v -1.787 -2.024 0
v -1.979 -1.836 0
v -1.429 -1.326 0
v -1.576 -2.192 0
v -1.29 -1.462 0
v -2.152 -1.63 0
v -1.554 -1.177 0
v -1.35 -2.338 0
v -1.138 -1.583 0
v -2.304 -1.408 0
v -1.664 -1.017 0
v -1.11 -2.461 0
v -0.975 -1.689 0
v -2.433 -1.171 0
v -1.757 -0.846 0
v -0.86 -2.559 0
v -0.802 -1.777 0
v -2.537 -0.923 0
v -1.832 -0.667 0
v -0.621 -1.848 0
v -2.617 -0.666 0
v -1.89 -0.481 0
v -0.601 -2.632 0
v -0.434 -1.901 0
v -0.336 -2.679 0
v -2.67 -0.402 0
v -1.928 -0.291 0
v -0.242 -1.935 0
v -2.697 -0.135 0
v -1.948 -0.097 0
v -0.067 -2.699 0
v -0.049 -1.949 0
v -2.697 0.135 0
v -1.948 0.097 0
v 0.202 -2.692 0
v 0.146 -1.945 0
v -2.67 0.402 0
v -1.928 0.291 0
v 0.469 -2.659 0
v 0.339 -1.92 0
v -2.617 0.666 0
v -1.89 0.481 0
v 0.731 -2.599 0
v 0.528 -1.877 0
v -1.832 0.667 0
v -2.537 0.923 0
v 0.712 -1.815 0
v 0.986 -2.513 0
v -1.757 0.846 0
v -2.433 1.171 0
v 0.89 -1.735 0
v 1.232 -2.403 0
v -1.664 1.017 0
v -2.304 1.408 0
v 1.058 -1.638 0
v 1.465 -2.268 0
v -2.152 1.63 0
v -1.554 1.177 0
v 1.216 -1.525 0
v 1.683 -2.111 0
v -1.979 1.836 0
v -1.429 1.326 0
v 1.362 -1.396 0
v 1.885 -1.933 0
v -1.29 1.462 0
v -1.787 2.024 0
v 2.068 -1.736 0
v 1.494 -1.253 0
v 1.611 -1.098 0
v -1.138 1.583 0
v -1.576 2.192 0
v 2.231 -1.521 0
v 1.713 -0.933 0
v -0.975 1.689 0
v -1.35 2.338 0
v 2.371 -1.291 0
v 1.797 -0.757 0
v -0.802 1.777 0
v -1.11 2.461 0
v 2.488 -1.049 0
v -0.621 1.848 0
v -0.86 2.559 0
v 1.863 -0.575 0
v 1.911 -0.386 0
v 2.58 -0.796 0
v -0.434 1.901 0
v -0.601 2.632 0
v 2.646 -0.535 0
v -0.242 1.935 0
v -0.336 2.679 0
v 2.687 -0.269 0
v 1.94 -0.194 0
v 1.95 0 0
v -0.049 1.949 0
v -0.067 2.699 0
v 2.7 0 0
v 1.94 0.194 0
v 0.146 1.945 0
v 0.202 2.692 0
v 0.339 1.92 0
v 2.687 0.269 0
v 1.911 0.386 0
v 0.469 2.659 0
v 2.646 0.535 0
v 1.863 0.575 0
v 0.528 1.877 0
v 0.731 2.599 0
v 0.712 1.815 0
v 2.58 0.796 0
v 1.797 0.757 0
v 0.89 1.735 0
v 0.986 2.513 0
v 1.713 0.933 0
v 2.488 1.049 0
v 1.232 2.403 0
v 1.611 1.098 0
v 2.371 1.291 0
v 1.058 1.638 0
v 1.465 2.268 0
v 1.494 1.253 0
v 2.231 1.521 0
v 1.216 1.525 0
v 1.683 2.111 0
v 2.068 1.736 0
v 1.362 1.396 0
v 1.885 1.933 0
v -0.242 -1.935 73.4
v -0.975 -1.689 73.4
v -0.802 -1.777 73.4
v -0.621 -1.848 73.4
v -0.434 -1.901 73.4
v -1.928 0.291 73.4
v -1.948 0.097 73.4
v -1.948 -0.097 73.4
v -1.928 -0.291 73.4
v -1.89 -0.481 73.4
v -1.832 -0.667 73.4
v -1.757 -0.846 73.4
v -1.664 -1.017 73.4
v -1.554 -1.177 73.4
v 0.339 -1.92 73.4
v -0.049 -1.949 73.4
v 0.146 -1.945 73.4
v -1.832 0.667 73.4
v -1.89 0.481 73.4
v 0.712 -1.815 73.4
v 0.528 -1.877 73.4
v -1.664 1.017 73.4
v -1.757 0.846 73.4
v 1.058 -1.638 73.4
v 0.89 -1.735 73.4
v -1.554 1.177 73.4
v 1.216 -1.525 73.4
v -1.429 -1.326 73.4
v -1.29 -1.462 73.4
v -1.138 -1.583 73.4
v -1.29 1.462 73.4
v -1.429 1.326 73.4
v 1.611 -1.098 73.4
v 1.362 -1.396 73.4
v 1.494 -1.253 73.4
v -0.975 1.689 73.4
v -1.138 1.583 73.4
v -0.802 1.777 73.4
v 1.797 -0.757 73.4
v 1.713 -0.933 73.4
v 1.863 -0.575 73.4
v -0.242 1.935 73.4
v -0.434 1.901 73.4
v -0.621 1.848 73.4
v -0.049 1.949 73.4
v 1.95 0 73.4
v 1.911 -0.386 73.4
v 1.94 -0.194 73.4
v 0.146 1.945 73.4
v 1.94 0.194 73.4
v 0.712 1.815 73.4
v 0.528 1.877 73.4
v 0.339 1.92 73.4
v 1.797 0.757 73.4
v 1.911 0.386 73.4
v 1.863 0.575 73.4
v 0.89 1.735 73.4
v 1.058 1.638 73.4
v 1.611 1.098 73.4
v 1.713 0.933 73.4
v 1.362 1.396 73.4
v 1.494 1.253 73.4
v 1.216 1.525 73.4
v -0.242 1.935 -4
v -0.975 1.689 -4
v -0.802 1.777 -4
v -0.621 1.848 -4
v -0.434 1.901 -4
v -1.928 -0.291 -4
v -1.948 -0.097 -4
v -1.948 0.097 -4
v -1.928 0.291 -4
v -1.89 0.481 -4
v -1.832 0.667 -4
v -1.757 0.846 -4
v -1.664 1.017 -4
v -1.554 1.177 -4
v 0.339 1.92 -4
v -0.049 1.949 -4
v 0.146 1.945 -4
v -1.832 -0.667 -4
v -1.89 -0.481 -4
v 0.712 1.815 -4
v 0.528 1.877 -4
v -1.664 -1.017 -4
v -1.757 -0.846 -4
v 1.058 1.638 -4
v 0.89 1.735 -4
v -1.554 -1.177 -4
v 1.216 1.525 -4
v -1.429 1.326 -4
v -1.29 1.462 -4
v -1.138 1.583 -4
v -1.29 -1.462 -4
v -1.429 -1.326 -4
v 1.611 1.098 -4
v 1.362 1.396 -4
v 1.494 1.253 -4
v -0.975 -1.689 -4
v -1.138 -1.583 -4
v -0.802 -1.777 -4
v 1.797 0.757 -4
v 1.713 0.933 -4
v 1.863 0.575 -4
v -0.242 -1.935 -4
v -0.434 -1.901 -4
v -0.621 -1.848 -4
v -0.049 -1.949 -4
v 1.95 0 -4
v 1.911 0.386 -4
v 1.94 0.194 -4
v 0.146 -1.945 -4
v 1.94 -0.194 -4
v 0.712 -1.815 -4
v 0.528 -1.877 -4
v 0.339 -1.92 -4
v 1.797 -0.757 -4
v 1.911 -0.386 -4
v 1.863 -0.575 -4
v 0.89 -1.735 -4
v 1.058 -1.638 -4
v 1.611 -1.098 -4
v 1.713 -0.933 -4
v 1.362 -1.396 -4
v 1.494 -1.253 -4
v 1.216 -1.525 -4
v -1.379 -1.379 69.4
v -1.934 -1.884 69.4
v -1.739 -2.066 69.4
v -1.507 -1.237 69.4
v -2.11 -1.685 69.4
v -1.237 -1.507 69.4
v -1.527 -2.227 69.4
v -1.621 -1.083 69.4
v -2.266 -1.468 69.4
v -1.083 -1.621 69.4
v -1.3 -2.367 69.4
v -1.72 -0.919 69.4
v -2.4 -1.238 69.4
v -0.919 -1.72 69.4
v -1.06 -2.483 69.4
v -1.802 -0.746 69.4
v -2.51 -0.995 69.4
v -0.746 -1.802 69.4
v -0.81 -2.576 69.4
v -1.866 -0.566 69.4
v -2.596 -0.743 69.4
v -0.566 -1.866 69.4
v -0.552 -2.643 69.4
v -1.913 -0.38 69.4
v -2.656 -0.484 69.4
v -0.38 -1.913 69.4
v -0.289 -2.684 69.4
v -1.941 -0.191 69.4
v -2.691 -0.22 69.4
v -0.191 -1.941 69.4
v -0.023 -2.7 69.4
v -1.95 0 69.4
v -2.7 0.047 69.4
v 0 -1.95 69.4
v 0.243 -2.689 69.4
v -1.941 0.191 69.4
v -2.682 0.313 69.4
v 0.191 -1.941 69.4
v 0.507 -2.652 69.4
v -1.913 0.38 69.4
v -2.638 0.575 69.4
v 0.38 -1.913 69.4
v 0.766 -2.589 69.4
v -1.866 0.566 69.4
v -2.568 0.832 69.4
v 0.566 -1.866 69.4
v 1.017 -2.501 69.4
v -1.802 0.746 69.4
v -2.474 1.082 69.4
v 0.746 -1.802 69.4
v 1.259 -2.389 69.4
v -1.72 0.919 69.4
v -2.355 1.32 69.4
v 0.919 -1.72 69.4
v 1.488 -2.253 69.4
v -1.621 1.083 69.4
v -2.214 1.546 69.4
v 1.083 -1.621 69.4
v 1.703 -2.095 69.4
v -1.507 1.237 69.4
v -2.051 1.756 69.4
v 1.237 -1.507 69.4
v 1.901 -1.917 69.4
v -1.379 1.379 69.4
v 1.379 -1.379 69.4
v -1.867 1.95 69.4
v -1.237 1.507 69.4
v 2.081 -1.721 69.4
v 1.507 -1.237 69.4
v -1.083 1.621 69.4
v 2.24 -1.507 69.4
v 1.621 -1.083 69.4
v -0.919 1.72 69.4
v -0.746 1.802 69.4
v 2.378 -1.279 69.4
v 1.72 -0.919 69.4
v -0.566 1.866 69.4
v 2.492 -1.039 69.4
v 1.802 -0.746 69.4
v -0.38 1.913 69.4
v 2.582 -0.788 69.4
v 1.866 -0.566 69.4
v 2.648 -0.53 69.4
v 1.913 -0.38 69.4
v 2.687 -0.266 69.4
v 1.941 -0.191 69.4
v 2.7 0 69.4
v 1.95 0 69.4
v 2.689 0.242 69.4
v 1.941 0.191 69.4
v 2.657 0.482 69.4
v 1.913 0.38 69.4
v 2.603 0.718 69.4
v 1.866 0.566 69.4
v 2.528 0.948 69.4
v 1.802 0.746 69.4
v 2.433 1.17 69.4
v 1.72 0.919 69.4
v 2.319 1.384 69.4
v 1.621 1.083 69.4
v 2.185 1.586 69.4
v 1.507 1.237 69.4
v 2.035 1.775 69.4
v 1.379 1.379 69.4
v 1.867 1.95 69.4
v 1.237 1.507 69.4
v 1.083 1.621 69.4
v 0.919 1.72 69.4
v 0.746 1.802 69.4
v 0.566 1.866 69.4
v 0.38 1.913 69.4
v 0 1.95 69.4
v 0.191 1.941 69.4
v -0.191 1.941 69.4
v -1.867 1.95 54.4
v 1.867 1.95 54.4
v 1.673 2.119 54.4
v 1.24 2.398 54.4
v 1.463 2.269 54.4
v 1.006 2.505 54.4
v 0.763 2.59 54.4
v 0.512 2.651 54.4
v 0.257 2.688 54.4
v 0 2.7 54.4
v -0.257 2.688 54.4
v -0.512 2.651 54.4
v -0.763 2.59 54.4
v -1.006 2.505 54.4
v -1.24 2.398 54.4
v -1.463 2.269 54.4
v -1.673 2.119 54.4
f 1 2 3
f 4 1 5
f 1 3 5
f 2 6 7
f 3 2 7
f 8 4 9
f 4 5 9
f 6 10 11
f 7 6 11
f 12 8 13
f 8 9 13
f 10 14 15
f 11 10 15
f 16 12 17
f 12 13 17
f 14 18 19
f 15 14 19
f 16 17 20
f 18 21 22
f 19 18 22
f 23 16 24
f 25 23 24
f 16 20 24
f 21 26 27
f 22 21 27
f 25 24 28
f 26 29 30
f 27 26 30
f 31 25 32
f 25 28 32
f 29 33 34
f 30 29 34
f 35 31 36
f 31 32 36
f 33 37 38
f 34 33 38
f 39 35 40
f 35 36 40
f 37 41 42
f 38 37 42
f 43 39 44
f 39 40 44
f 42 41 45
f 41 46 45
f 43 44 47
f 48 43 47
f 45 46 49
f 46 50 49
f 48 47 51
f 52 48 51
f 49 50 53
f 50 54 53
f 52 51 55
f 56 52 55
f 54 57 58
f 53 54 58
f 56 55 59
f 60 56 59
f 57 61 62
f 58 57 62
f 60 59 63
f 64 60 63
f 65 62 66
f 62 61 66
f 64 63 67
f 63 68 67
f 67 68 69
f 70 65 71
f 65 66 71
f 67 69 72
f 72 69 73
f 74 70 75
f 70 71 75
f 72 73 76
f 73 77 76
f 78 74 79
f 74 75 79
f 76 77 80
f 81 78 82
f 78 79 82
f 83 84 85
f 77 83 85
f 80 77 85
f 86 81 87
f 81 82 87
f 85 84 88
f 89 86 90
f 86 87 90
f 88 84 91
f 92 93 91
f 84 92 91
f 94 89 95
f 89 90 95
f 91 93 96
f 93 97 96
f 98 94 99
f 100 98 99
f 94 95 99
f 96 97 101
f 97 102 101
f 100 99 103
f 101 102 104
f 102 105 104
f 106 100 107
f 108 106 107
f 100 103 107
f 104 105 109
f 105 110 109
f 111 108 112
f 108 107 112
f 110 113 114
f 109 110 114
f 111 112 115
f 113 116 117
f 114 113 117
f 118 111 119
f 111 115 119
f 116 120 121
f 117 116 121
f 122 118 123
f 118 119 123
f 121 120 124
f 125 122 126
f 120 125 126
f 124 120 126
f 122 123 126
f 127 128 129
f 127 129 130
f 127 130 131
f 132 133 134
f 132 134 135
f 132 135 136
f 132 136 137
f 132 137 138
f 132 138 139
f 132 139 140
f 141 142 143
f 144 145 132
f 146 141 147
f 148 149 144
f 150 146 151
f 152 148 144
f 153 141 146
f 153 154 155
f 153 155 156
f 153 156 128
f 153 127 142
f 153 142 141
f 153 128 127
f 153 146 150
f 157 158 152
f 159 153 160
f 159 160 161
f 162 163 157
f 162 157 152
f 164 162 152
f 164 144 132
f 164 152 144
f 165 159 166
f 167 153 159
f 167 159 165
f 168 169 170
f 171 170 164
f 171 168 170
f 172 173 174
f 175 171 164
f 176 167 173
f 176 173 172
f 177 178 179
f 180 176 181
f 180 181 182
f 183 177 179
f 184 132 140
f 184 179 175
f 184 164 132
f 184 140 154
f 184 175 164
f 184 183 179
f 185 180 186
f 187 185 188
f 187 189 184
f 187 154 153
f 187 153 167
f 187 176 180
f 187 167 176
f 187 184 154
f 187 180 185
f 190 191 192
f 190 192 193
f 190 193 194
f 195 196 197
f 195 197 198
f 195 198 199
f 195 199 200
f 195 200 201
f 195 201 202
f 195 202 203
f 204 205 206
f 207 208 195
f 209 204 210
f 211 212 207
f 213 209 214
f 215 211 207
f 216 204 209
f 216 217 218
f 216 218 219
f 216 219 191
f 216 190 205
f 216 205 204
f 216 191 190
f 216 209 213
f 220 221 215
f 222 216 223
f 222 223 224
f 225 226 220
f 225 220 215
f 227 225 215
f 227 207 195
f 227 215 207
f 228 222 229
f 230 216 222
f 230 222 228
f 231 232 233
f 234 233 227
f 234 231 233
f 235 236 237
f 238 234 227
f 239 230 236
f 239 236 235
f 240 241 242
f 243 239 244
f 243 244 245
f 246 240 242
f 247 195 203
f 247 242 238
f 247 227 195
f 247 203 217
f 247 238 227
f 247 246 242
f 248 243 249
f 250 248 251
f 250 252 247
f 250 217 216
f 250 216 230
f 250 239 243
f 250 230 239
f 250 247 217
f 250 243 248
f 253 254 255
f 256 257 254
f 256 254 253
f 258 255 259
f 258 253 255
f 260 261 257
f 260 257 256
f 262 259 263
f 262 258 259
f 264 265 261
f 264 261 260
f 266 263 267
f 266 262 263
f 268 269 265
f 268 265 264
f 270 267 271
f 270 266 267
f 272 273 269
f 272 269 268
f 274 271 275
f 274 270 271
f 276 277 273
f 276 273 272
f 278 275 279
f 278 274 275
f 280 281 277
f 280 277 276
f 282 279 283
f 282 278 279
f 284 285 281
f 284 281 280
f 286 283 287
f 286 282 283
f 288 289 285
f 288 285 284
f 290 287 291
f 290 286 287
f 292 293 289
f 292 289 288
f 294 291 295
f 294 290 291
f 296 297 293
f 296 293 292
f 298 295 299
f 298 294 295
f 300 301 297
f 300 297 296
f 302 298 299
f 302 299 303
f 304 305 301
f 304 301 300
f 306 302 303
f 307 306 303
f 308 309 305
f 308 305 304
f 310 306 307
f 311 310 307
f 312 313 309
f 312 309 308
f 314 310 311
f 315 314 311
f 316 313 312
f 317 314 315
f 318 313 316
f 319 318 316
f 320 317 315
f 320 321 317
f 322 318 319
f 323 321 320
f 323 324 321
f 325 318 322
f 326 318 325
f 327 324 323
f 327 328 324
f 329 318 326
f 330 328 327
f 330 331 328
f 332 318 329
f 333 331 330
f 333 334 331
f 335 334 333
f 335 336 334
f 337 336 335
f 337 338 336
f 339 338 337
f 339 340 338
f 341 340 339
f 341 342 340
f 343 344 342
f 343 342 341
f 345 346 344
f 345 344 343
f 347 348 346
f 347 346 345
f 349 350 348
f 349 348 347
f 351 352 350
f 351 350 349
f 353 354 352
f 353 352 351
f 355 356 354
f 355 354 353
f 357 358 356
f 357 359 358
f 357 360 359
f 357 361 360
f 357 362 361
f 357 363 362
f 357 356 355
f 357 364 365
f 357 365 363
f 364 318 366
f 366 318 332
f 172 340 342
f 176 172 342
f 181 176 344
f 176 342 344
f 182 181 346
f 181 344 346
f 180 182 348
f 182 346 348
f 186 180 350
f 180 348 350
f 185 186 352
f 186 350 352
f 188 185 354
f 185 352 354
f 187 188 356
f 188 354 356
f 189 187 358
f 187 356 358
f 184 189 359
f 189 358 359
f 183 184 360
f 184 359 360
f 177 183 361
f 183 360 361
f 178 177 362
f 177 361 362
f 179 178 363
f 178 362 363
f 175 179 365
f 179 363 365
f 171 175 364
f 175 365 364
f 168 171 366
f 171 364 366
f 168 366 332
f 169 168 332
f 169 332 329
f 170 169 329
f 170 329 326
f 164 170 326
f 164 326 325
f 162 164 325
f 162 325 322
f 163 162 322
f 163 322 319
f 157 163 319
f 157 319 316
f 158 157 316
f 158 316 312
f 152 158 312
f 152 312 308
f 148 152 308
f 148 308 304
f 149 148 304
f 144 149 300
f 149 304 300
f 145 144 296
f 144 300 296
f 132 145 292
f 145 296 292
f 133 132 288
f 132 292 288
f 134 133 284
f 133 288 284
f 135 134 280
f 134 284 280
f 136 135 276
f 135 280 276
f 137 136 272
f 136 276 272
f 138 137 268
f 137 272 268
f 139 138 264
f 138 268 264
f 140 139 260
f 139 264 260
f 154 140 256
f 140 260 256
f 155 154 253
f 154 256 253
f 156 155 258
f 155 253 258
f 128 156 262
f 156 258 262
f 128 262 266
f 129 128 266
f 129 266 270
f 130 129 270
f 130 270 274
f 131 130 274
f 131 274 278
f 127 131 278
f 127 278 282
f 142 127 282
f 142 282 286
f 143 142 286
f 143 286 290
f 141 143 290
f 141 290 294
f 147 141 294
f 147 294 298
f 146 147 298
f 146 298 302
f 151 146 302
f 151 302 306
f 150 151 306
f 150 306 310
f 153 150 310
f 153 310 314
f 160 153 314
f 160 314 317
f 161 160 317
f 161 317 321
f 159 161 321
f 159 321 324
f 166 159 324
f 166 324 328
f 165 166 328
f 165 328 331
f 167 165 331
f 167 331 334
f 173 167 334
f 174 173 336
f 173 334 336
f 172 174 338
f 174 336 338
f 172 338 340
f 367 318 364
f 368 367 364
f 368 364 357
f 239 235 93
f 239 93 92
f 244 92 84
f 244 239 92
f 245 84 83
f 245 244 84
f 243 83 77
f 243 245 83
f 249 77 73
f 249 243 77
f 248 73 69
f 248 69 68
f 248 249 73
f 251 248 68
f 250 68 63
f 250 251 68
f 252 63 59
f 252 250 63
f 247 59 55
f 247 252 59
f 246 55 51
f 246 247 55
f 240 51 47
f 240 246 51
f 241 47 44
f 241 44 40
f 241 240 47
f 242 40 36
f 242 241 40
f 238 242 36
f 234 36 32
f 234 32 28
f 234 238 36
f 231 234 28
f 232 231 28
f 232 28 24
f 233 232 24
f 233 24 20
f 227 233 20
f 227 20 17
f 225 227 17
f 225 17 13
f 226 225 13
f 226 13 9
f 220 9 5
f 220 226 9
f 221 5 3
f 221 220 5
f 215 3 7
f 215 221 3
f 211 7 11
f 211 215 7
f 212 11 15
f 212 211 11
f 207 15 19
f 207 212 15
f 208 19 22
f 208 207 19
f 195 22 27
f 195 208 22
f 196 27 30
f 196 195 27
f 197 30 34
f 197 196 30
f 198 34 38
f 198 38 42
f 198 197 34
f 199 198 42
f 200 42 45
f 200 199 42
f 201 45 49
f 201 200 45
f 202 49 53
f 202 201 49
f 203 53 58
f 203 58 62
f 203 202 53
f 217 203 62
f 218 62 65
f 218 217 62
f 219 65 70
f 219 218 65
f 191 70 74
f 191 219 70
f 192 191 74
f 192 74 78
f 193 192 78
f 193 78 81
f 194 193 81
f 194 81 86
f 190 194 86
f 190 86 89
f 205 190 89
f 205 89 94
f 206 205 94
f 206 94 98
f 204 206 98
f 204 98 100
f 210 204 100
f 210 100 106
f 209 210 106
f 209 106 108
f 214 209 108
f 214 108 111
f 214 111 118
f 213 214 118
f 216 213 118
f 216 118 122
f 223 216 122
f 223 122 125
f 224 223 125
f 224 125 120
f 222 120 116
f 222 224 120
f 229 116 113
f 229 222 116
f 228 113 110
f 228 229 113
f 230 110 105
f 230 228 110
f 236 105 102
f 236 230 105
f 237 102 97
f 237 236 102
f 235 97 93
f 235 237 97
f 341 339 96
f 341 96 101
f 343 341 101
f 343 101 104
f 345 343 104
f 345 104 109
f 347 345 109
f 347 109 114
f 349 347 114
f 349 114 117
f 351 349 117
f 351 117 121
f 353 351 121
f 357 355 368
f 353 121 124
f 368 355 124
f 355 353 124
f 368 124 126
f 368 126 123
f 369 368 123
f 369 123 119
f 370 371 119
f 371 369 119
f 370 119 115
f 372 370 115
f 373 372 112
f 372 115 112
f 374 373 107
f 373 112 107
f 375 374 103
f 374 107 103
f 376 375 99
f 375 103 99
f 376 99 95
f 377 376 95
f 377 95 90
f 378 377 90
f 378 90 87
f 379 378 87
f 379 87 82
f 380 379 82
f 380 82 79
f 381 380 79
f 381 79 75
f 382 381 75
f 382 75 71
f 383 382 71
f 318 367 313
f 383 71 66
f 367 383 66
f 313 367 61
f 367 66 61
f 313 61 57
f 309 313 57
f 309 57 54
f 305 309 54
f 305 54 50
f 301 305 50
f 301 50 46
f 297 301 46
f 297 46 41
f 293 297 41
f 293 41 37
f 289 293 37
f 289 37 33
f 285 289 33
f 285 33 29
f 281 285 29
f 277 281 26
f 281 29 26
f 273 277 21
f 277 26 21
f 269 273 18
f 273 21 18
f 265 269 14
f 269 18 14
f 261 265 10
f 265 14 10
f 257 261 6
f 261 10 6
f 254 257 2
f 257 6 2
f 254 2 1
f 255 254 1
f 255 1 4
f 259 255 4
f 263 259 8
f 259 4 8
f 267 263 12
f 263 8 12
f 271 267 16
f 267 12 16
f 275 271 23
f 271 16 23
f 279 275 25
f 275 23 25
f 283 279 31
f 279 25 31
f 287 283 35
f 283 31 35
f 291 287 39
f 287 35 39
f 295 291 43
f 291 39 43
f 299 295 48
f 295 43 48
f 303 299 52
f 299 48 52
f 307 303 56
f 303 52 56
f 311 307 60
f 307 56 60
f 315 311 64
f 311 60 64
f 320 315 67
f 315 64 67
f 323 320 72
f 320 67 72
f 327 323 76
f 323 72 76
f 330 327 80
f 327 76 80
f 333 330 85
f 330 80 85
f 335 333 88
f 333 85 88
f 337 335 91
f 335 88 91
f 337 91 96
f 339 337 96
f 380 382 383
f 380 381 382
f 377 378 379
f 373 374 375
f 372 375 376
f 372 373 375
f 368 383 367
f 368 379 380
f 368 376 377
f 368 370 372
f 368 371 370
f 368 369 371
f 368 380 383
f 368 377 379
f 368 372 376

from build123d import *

# Parameters (mm, degrees)
ESBO_O1_R                = 2.7
RESSALTO_EXTRUS_O1_DEPTH = 69.4
ESBO_O2_R                = 1.95
RESSALTO_EXTRUS_O2_DEPTH = 4
RESSALTO_EXTRUS_O3_START = 4
ESBO_O3_R                = 1.95
RESSALTO_EXTRUS_O3_DEPTH = 4
ESBO_O5_W                = 3.73496988
ESBO_O5_H                = 0.75
CORTE_EXTRUS_O2_DEPTH    = 15


with BuildPart() as part:
    # Esboço1 → Ressalto-extrusão1 (new body)
    with BuildSketch(Plane.XY):
        Circle(ESBO_O1_R)
    extrude(amount=RESSALTO_EXTRUS_O1_DEPTH)

    # Esboço2 → Ressalto-extrusão2 (add)
    with BuildSketch(Plane.XY.offset(69.4)):
        Circle(ESBO_O2_R)
    extrude(amount=RESSALTO_EXTRUS_O2_DEPTH)

    # Esboço3 → Ressalto-extrusão3 (add)
    with BuildSketch(Plane(origin=(0, 0, 0), x_dir=(-1, 0, 0), z_dir=(0, 0, -1)).offset(RESSALTO_EXTRUS_O3_START)):
        with Locations(Location((0, 0, 0), (0, 0, 180))):
            Circle(ESBO_O3_R)
    extrude(amount=-RESSALTO_EXTRUS_O3_DEPTH)

    # Esboço5 → Corte-extrusão2 (cut)
    with BuildSketch(Plane.XY.offset(69.4)):
        with Locations((0, 2.325)):
            Rectangle(ESBO_O5_W, ESBO_O5_H)
    extrude(amount=-CORTE_EXTRUS_O2_DEPTH, mode=Mode.SUBTRACT)


solid = part.part
